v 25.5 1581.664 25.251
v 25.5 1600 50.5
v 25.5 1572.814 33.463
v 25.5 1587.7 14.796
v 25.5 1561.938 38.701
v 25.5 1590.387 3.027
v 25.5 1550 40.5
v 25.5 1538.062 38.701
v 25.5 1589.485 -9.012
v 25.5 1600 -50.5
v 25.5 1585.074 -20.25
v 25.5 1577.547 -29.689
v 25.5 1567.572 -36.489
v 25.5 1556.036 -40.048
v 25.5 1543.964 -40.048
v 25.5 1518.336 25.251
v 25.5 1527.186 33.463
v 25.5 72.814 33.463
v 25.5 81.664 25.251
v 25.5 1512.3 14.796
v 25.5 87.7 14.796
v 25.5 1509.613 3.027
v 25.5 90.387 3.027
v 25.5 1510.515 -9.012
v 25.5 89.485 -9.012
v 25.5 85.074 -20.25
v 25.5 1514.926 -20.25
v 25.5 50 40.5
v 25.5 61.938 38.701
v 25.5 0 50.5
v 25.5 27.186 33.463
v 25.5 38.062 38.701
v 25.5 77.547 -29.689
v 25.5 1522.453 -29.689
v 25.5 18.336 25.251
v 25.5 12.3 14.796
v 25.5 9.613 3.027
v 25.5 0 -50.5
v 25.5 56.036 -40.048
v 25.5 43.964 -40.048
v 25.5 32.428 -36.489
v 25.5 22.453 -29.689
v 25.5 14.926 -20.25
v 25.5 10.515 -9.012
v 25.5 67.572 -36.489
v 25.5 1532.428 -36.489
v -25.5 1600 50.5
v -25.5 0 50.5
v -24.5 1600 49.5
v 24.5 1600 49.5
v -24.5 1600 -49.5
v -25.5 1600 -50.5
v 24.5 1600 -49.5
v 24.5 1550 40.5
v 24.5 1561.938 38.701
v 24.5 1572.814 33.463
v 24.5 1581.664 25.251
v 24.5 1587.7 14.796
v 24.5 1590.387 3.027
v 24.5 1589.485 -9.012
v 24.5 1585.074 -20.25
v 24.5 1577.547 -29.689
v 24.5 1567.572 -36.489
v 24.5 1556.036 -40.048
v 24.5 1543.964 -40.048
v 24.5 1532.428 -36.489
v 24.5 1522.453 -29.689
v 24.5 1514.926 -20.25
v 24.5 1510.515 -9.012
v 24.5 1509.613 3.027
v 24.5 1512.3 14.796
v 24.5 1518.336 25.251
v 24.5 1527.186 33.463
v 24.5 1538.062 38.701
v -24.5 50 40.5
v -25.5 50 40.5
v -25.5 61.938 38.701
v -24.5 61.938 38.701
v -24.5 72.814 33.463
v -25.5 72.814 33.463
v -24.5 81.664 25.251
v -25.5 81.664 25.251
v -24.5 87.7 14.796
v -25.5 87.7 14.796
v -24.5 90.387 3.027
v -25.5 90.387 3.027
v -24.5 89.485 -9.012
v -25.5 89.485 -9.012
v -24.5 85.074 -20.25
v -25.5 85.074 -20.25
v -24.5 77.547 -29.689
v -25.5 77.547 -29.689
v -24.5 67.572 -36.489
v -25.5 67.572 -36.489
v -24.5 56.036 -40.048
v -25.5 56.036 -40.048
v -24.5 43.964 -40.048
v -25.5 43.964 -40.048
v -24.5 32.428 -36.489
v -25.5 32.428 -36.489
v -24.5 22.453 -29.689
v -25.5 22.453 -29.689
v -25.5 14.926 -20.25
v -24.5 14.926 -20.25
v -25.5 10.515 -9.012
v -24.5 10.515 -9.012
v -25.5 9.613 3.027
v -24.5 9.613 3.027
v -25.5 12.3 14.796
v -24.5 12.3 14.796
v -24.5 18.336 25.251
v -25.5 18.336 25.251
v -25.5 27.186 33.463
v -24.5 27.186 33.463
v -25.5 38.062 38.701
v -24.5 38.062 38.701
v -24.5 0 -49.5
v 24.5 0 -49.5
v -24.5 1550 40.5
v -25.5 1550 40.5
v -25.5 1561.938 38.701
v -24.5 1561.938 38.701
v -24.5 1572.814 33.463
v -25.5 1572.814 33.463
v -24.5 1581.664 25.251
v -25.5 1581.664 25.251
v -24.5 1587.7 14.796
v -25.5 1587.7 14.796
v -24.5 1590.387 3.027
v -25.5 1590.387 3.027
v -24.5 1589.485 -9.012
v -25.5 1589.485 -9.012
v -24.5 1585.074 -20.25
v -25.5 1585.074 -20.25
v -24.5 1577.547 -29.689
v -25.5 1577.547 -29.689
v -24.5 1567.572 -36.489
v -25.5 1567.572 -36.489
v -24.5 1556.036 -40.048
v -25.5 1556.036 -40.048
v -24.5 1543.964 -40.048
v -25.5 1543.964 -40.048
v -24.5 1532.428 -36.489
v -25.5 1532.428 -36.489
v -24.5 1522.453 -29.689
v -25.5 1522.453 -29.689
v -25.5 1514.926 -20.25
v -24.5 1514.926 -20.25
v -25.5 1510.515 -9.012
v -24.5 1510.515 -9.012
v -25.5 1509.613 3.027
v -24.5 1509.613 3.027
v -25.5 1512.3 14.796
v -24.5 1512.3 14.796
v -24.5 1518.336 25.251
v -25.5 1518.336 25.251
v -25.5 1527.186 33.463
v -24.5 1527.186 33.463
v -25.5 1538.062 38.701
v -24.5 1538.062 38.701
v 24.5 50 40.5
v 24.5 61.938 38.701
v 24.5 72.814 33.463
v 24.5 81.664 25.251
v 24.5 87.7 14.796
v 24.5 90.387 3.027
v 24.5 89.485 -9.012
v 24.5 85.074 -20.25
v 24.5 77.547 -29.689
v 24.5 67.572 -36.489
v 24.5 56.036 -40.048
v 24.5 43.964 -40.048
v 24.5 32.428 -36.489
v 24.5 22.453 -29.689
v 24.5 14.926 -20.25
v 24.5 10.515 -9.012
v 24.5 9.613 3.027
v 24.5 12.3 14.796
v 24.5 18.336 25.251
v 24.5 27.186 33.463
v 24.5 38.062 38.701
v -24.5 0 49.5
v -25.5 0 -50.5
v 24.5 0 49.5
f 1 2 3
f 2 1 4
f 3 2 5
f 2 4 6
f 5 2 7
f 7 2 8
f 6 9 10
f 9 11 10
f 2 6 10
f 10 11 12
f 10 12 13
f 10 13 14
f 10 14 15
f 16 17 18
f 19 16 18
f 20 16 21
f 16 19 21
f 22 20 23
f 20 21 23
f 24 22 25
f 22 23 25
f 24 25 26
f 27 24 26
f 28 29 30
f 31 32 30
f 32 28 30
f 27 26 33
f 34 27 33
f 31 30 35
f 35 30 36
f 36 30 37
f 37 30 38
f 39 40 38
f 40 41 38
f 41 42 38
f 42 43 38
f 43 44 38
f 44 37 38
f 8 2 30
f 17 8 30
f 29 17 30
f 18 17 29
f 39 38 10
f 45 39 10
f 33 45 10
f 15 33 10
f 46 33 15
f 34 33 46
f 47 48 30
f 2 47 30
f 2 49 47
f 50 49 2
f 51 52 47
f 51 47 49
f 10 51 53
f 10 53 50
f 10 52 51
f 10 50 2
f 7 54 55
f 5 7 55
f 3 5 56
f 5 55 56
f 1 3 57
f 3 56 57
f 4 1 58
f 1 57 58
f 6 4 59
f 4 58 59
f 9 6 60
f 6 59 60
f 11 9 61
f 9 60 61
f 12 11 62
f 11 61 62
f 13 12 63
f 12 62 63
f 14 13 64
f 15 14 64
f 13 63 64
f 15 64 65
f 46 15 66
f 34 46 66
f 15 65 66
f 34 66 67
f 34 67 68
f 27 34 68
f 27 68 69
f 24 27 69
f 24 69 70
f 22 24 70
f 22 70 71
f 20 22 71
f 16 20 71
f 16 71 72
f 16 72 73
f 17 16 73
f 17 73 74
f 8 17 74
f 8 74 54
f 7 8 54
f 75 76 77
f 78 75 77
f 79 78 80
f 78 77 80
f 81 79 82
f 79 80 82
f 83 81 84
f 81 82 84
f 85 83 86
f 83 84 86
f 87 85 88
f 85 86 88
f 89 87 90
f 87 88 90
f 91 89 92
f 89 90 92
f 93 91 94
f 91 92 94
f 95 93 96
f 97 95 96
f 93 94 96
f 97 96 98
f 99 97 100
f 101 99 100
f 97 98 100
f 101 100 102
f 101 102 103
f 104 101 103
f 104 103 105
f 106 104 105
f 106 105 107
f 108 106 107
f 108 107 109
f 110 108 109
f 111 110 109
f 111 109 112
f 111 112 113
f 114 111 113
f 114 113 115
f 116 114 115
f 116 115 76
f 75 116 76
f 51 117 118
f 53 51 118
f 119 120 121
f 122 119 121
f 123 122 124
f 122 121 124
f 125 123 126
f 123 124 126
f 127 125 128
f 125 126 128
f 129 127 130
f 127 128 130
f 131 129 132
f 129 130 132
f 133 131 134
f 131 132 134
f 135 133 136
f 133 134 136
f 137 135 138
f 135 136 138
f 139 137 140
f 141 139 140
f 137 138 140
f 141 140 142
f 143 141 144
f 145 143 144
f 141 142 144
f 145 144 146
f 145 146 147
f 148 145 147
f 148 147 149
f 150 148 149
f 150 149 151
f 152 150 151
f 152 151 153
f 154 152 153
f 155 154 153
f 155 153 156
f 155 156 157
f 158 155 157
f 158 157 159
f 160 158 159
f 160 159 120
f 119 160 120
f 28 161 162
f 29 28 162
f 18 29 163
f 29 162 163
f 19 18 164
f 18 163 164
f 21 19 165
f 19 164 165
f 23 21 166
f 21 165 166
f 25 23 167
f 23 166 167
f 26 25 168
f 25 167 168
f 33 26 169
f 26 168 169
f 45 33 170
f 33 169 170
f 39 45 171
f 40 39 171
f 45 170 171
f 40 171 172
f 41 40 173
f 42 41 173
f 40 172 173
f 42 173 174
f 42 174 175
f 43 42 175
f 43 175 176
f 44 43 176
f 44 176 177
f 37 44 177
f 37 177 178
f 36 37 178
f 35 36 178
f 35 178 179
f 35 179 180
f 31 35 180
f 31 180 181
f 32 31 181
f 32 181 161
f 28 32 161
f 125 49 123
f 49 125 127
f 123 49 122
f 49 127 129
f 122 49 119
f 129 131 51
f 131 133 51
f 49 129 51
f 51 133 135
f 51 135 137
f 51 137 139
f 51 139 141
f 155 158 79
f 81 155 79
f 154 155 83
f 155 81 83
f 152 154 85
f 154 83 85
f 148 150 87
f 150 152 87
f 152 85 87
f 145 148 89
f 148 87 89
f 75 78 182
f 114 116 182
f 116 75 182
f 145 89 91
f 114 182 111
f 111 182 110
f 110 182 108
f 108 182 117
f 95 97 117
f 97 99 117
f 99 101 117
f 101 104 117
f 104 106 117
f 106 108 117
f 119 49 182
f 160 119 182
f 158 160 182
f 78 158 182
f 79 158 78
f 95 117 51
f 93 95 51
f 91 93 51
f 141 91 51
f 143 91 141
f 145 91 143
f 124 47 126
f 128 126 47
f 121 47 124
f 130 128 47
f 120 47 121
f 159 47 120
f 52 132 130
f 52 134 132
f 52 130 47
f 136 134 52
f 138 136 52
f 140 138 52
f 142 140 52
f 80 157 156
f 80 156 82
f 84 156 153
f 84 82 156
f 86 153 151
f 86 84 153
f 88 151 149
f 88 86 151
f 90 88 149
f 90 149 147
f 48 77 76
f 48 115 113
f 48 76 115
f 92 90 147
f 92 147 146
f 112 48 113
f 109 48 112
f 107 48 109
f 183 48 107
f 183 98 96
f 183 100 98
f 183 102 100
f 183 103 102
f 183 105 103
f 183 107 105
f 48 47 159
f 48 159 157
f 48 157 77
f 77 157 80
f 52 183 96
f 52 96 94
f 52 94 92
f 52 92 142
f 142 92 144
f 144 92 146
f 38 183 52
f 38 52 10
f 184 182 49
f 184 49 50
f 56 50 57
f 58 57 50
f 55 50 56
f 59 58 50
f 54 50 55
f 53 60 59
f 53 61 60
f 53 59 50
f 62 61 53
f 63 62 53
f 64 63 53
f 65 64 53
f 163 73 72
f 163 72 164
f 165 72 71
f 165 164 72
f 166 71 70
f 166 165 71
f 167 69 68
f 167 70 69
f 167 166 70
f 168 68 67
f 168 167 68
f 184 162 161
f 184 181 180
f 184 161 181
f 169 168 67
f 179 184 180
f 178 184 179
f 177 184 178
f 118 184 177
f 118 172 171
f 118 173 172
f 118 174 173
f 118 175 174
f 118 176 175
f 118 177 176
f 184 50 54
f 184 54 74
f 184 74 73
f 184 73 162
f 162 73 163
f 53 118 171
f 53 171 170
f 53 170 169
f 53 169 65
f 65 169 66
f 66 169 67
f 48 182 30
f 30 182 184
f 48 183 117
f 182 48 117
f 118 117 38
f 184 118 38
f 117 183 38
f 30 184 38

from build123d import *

# Parameters (mm, degrees)
SKETCH2_W           = 51
SKETCH2_H           = 101
SKETCH2_W_2         = 49
SKETCH2_H_2         = 99
BOSS_EXTRUDE2_DEPTH = 1600
SKETCH3_R           = 40.5
CUT_EXTRUDE2_DEPTH  = 52


with BuildPart() as part:
    # Sketch2 → Boss-Extrude2 (new body)
    with BuildSketch(Plane(origin=(0, 0, 0), x_dir=(1, 0, 0), z_dir=(0, 1, 0))):
        Rectangle(SKETCH2_W, SKETCH2_H)
        Rectangle(SKETCH2_W_2, SKETCH2_H_2, mode=Mode.SUBTRACT)
    extrude(amount=BOSS_EXTRUDE2_DEPTH)

    # Sketch3 → Cut-Extrude2 (cut, through all)
    with BuildSketch(Plane.ZY.offset(25.5)):
        with Locations((0, 50)):
            Circle(SKETCH3_R)
        with Locations((0, 1550)):
            Circle(SKETCH3_R)
    extrude(amount=-CUT_EXTRUDE2_DEPTH, mode=Mode.SUBTRACT)


solid = part.part
